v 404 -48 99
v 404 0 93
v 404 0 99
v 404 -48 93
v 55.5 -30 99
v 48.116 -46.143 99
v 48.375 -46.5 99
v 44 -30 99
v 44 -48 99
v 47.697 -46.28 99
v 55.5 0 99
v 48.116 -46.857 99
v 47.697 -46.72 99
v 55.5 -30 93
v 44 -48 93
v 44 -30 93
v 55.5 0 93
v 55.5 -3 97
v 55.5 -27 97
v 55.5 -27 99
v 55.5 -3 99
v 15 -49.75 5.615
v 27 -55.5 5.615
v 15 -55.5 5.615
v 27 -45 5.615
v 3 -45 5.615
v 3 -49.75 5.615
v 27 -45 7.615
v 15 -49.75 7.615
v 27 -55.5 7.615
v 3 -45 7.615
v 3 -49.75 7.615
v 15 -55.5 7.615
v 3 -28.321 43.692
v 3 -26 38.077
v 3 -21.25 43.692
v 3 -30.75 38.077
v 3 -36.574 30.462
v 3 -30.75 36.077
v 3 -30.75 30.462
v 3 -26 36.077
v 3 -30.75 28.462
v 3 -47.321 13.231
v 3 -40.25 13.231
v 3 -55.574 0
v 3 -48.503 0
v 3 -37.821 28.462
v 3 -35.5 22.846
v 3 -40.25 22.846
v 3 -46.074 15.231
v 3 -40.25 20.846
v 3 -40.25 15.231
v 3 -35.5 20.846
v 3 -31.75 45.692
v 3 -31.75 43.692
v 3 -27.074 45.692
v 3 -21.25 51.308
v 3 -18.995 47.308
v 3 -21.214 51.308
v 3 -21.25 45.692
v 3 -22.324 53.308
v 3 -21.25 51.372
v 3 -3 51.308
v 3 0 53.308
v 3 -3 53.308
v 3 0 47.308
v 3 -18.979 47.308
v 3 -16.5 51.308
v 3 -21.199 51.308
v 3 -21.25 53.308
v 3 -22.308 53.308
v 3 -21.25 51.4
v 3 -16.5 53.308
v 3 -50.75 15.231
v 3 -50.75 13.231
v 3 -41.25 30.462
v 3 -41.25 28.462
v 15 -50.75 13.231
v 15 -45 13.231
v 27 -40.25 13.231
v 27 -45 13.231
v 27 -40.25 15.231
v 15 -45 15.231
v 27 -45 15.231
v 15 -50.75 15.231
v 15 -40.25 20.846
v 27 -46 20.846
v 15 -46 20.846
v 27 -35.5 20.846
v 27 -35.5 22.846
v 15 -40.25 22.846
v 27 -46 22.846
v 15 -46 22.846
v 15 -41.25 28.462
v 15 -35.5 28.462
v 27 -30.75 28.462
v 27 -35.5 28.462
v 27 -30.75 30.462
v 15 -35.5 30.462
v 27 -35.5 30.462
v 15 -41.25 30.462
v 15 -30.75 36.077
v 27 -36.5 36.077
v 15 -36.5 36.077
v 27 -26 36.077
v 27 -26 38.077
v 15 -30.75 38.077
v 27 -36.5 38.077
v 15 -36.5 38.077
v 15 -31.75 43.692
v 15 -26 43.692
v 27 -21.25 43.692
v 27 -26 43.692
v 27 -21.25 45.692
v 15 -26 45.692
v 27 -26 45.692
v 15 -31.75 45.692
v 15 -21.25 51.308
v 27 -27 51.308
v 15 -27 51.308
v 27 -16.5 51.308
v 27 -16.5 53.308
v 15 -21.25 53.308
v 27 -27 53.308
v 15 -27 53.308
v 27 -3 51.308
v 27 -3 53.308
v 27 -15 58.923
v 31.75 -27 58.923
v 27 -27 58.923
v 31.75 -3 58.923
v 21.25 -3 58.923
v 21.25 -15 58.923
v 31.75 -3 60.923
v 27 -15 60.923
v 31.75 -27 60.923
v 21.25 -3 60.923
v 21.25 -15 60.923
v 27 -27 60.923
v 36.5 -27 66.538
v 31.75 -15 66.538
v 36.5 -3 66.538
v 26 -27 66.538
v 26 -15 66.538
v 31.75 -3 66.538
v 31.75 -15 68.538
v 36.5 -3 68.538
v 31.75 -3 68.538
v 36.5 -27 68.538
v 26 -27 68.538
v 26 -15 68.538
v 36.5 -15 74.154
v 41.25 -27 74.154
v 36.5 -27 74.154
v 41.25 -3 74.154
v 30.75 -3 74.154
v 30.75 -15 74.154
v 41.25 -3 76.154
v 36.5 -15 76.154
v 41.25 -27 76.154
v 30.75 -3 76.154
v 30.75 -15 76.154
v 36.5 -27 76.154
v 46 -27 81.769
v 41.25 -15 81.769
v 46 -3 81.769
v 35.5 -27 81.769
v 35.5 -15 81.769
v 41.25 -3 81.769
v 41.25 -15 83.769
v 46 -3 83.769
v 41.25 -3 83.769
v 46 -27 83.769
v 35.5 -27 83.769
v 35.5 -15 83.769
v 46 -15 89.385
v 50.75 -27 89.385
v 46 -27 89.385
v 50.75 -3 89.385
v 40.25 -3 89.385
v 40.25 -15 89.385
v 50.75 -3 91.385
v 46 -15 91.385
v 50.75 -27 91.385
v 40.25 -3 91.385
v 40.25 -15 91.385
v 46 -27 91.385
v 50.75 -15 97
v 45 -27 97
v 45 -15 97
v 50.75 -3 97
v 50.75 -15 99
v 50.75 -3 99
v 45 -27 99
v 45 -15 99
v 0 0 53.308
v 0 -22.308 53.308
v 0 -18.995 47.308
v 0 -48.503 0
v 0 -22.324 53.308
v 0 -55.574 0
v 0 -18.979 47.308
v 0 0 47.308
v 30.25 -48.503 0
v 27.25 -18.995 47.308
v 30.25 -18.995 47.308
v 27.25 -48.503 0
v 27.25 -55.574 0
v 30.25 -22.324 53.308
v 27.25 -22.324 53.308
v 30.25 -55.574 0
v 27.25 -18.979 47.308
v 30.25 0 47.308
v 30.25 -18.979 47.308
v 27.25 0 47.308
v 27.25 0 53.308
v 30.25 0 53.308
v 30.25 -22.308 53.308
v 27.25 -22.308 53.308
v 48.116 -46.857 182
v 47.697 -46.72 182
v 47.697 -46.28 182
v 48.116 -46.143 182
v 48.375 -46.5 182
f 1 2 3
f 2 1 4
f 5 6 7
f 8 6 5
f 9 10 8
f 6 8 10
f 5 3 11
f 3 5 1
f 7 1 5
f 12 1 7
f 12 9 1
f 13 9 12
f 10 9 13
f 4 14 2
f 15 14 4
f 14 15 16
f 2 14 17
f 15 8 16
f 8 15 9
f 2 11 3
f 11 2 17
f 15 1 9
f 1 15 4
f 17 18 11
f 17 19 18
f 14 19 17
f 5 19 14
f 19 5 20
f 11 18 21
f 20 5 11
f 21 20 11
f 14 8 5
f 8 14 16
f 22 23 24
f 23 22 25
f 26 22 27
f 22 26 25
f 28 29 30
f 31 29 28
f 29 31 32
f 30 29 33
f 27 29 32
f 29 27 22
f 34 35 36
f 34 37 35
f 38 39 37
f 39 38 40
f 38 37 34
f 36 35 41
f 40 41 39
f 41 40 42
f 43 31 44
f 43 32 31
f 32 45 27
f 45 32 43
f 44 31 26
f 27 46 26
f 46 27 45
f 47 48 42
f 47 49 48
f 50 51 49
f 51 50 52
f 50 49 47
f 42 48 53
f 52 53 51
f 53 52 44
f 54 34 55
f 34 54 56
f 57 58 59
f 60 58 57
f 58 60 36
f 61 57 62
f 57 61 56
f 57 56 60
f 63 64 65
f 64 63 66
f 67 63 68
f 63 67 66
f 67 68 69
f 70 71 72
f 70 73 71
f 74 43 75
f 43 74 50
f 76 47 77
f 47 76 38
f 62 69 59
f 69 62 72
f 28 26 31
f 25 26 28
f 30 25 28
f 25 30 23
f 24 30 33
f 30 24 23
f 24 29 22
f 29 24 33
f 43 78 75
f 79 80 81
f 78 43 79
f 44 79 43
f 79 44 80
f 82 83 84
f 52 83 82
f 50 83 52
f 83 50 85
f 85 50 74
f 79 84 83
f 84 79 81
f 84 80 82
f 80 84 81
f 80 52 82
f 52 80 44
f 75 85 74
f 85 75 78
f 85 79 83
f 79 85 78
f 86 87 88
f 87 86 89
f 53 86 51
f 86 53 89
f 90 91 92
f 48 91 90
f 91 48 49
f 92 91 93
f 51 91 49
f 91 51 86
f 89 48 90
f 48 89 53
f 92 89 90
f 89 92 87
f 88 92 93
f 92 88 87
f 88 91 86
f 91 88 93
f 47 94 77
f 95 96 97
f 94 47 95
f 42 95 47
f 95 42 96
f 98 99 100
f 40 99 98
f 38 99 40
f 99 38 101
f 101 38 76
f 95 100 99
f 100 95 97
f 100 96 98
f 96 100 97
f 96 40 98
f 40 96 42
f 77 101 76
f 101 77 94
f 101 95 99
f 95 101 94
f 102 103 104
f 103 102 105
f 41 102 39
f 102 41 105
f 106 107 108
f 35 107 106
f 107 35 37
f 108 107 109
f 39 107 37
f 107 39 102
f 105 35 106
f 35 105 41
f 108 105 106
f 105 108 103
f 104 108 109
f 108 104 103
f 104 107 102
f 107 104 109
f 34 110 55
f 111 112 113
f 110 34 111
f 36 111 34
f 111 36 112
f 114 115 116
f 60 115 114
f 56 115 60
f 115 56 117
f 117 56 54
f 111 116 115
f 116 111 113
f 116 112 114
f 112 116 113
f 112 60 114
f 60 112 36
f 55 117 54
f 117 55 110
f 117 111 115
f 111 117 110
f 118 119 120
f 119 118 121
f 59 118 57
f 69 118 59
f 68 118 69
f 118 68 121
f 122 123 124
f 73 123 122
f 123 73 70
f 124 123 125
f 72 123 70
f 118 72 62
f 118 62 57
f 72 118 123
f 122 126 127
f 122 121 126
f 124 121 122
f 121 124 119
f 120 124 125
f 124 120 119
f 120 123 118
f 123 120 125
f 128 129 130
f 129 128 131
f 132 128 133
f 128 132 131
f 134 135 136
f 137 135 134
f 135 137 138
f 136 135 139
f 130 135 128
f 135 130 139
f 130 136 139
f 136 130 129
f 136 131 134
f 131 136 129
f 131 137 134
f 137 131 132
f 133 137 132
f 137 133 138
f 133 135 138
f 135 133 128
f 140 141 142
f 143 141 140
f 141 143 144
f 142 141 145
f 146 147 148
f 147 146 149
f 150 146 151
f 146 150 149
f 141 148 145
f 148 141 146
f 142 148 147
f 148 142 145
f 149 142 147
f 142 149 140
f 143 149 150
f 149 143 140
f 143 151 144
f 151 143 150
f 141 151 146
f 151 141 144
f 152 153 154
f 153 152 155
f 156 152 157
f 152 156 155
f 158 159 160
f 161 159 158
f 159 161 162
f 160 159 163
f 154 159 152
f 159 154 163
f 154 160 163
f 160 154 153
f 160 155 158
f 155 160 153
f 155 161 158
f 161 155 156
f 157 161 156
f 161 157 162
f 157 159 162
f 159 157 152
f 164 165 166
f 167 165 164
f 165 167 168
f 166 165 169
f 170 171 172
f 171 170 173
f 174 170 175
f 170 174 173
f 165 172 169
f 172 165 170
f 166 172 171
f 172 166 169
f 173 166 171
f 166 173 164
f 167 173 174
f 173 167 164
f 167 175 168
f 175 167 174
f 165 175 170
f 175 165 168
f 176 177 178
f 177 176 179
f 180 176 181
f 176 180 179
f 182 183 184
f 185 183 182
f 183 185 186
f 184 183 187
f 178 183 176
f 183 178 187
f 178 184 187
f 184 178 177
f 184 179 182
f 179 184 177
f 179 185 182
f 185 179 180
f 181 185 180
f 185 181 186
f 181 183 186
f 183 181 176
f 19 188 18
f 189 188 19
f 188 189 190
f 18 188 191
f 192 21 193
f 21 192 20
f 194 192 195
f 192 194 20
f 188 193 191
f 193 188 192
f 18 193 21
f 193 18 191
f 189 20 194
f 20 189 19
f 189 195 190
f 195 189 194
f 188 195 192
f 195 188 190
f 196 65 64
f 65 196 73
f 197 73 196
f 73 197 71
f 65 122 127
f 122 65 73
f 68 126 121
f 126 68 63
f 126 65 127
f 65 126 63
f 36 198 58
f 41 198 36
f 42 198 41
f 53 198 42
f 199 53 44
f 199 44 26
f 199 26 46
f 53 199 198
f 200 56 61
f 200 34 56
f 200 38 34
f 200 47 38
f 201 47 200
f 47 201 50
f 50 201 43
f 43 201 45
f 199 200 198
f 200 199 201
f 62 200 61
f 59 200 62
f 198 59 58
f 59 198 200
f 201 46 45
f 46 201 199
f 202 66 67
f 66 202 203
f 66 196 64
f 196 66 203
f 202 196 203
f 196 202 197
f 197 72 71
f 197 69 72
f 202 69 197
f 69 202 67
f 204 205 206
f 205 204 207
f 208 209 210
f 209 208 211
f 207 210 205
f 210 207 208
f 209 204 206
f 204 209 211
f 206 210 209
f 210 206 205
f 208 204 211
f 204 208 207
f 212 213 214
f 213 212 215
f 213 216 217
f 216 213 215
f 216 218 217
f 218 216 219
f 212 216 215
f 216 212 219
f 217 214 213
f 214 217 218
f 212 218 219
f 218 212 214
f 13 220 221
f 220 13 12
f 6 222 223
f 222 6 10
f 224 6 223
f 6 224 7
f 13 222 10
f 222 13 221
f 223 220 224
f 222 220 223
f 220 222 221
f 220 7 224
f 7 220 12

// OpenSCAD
// file: math.scad
function sum( v, i = 0) = i < len( v) ? v[ i] + sum( v, i + 1) : 0;

function vector_sum( v, i = 0) = i < len( v) - 1 ? let( w = vector_sum( v, i + 1)) [ for ( j = [ 0: len( w) - 1]) v[ i][ j] + w[ j]] : v[ i];
function vector_difference( a, b) = [ for ( i = [ 0: len( a) - 1]) a[ i] - b[ i]];
function vector_length( v) = sqrt( sum( [ for ( i = v) i * i]));
function vector_scale( v, x) = [ for ( i = v) i * x];

function normalize_angle( a) =
        a < -180
        ? normalize_angle( a + 360)
        : ( a > 180
            ? normalize_angle( a - 360)
            : a);

function polar_to_vector( a, m) =
        [ cos( a) * m, sin( a) * m];

function vector_to_angle( v) = atan2( v[ 1], v[ 0]);
function vector_to_polar( v) = [ vector_to_angle( v), vector_length( v)];
// main file
use <math.scad>;

function feet( x) = inches( x) * 12;
function inches( x) = x;

function loft_length() = feet(30.0);
function loft_width() = inches( 48.0);
function loft_surface_height() = inches( 99.0);
function loft_thickness() = inches( 6.0);

function loft_stairs_total_steps() = 13;
function loft_stairs_upper_flight_steps() = 6;

function loft_stairs_lower_flight_steps() = loft_stairs_total_steps() - loft_stairs_upper_flight_steps();
function loft_stairs_landing_body_width() = loft_stairs_tread_width() - loft_stairs_tread_run() / 2 - loft_stairs_tread_nose();
function loft_stairs_landing_surface_height() = loft_stairs_lower_flight_steps() * loft_stairs_tread_rise();


module loft() {
    union() {
        translate( [ inches( 48) - inches(4), -loft_width(), loft_surface_height() - loft_thickness()]) {
            difference() {
                cube( [ loft_length(), loft_width(), loft_thickness()]);
                translate( [ -inches(1), loft_width() - loft_stairs_tread_width() - inches(6), -inches(1)]) {
                    cube( [ loft_stairs_tread_run() / 2 + inches( 6.75) + inches(1), loft_stairs_tread_width() + 2*inches(3) + inches(1), loft_thickness() + inches(2)]);
                }
            }
        }
        translate( [ inches(48), -loft_width() + inches(1.5), loft_surface_height() - inches(1)]) {
            cylinder(d=inches(.75),h=feet(7));
        }
        loft_stairs();
    }
}

module position_loft_stairs() {
//    position_greatroom() {
        translate( [ inches(3), inches(-3), 0]) {
            children();
        }
//    }
}

module loft_stairs() {
    position_loft_stairs() {
        union() {
            translate( [ 0, -( loft_stairs_tread_width() - loft_stairs_tread_nose() + ( loft_stairs_lower_flight_steps() - 2) * loft_stairs_tread_run() / 2), 0]) {
                for (i = [ 1: loft_stairs_lower_flight_steps()]) {
                    left = ( i % 2) == 0;
                    translate( [ left ? 0 : loft_stairs_tread_width(), i * loft_stairs_tread_run() / 2, i * loft_stairs_tread_rise()]) {
                        scale( [ left ? 1 : -1, 1, 1]) {
                            color( [ left ? 1.0 : 0.0, 0.5, left ? 0.0 : 1.0]) {
                                loft_stairs_tread();
                            }
                        }
                    }
                }
            }
            translate( [ 0, 0, loft_stairs_landing_surface_height()]) {
                translate( [ 0, -loft_stairs_landing_body_width() + inches(4.75), -loft_stairs_tread_thickness()]) {
                    cube( [ loft_stairs_tread_width(), loft_stairs_landing_body_width() - inches(4.75), loft_stairs_tread_thickness()]);
                }
                rotate( [ 0, 0, -90]) {
                    translate( [ 0, loft_stairs_tread_width(), 0]) {
                        for (i = [ 1: loft_stairs_upper_flight_steps()]) {
                            left = ( i % 2) != 0;
                            translate( [ left ? 0 : loft_stairs_tread_width(), i * loft_stairs_tread_run() / 2, i * loft_stairs_tread_rise()]) {
                                scale( [ left ? 1 : -1, 1, 1]) {
                                    color( [ left ? 1.0 : 0.0, 0.5, left ? 0.0 : 1.0]) {
                                        loft_stairs_tread();
                                    }
                                }
                            }
                        }
                    }
                }
            }
            loft_stairs_lower_left_stringer();
            translate( [ loft_stairs_landing_body_width() + 2 * inches(3), 0, 0]) scale( [ -1, 1, 1]) loft_stairs_lower_left_stringer();
        }
    }
}


module loft_stairs_lower_left_stringer() {
    depth = inches(6);
    width = inches(3);
    thickness = inches( 5.0/16);
    bottom_length_x = loft_stairs_lower_flight_steps() * loft_stairs_tread_run() / 2;
    bottom_length_y = loft_stairs_landing_surface_height();
    angle = atan2( loft_stairs_tread_rise(), loft_stairs_tread_run() / 2);
    union() {
        translate( [ 0, loft_stairs_tread_run() / 2 - loft_stairs_landing_body_width(), loft_stairs_landing_surface_height() - loft_stairs_tread_thickness()]) {
            rotate( [ 0, 90 + angle, -90]) {
                translate( [ -depth, 0, ( depth - loft_stairs_tread_thickness()) / sin(angle) - depth * tan(angle/2)]) {
                    difference() {
                        length = vector_length( [ bottom_length_x, bottom_length_y]) - depth / sin(angle) + depth * tan(angle/2) + depth / tan(angle);
                        translate([0, -width, 0]) cube( [ depth, width, length]);
//                        c_channel( depth = depth, width = width, thickness = thickness, length = length);
                        rotate( [ 0, -angle/2, 0]) translate( [ -depth/2, -1.5 * width, -max(width,depth) * 2]) cube( [ depth * 2, width * 2, max(width,depth) * 2]);
                        translate( [ 0, 0, length]) rotate( [ 0, 90 - angle, 0]) translate( [ -depth/2, -1.5 * width, 0]) cube( [ depth * 2, width * 2, max(width,depth) * 2]);
                    }
                }
            }
        }
        translate( [ 0, width, loft_stairs_tread_rise() * loft_stairs_lower_flight_steps()]) {
            rotate( [ 0, 90, -90]) {
                difference() {
                    length = loft_stairs_landing_body_width() + width + cos(angle) * loft_stairs_tread_thickness();
                    translate([0, -width, 0]) cube( [ depth, width, length]);
//                    c_channel( depth = depth, width = width, thickness = thickness, length = length);
                    translate( [ 0, 0, length]) rotate( [ 0, angle/2, 0]) translate( [ -depth/2, -1.5 * width, 0]) cube( [ depth * 2, width * 2, max(width,depth) * 2]);
                }
            }
        }
    }
}


/*
 *
 * y1 - A-------------B
 *      |             |
 * y2 - |       D-----C
 *      |      /
 * y3 - F-----E
 *
 *      |     | |     |
 *
 *      x     x x     x
 *      1     2 3     4
 */

function loft_stairs_tread_rise() = loft_surface_height() / loft_stairs_total_steps();
function loft_stairs_tread_run() = inches( 9.5);

function loft_stairs_tread_thickness() = inches(2);
function loft_stairs_tread_width() = inches(24);
function loft_stairs_tread_nose() = inches(1);
function loft_stairs_tread_separation() = 0;

module loft_stairs_tread() {
    translate( [ 0, 0, -loft_stairs_tread_thickness()]) {
        linear_extrude( height = loft_stairs_tread_thickness()) {

            y1 = 0;
            y2 = y1 - loft_stairs_tread_run() / 2;
            y3 = y1 - loft_stairs_tread_run() - loft_stairs_tread_nose();

            x1 = 0;
            x2 = loft_stairs_tread_width() / 2 - loft_stairs_tread_separation() / 2;
            x3 = x2 + loft_stairs_tread_separation();
            x4 = loft_stairs_tread_width();

            A = [ x1, y1];
            B = [ x4, y1];
            C = [ x4, y2];
            D = [ x3, y2];
            E = [ x2, y3];
            F = [ x1, y3];

            polygon( points = [ A, B, C, D, E, F]);
        }
    }
}



/*
 *
 * y1 - A-----------B
 * y2 - | E-------D |
 *      |/         \|
 * y3 - F           C
 *
 *      | |       | |
 *
 *      x x       x x
 *      1 2       3 4
 */

module c_channel( depth, width, thickness, length) {
    linear_extrude( height = length) {
        y1 = 0;
        y2 = -thickness;
        y3 = -width;

        x1 = 0;
        x2 = 2 * thickness;
        x3 = depth - 2 * thickness;
        x4 = depth;

        A = [ x1, y1];
        B = [ x4, y1];
        C = [ x4, y3];
        D = [ x3, y2];
        E = [ x2, y2];
        F = [ x1, y3];

        polygon( points = [ A, B, C, D, E, F]);
    }
}



// Standalone rendering
loft();
